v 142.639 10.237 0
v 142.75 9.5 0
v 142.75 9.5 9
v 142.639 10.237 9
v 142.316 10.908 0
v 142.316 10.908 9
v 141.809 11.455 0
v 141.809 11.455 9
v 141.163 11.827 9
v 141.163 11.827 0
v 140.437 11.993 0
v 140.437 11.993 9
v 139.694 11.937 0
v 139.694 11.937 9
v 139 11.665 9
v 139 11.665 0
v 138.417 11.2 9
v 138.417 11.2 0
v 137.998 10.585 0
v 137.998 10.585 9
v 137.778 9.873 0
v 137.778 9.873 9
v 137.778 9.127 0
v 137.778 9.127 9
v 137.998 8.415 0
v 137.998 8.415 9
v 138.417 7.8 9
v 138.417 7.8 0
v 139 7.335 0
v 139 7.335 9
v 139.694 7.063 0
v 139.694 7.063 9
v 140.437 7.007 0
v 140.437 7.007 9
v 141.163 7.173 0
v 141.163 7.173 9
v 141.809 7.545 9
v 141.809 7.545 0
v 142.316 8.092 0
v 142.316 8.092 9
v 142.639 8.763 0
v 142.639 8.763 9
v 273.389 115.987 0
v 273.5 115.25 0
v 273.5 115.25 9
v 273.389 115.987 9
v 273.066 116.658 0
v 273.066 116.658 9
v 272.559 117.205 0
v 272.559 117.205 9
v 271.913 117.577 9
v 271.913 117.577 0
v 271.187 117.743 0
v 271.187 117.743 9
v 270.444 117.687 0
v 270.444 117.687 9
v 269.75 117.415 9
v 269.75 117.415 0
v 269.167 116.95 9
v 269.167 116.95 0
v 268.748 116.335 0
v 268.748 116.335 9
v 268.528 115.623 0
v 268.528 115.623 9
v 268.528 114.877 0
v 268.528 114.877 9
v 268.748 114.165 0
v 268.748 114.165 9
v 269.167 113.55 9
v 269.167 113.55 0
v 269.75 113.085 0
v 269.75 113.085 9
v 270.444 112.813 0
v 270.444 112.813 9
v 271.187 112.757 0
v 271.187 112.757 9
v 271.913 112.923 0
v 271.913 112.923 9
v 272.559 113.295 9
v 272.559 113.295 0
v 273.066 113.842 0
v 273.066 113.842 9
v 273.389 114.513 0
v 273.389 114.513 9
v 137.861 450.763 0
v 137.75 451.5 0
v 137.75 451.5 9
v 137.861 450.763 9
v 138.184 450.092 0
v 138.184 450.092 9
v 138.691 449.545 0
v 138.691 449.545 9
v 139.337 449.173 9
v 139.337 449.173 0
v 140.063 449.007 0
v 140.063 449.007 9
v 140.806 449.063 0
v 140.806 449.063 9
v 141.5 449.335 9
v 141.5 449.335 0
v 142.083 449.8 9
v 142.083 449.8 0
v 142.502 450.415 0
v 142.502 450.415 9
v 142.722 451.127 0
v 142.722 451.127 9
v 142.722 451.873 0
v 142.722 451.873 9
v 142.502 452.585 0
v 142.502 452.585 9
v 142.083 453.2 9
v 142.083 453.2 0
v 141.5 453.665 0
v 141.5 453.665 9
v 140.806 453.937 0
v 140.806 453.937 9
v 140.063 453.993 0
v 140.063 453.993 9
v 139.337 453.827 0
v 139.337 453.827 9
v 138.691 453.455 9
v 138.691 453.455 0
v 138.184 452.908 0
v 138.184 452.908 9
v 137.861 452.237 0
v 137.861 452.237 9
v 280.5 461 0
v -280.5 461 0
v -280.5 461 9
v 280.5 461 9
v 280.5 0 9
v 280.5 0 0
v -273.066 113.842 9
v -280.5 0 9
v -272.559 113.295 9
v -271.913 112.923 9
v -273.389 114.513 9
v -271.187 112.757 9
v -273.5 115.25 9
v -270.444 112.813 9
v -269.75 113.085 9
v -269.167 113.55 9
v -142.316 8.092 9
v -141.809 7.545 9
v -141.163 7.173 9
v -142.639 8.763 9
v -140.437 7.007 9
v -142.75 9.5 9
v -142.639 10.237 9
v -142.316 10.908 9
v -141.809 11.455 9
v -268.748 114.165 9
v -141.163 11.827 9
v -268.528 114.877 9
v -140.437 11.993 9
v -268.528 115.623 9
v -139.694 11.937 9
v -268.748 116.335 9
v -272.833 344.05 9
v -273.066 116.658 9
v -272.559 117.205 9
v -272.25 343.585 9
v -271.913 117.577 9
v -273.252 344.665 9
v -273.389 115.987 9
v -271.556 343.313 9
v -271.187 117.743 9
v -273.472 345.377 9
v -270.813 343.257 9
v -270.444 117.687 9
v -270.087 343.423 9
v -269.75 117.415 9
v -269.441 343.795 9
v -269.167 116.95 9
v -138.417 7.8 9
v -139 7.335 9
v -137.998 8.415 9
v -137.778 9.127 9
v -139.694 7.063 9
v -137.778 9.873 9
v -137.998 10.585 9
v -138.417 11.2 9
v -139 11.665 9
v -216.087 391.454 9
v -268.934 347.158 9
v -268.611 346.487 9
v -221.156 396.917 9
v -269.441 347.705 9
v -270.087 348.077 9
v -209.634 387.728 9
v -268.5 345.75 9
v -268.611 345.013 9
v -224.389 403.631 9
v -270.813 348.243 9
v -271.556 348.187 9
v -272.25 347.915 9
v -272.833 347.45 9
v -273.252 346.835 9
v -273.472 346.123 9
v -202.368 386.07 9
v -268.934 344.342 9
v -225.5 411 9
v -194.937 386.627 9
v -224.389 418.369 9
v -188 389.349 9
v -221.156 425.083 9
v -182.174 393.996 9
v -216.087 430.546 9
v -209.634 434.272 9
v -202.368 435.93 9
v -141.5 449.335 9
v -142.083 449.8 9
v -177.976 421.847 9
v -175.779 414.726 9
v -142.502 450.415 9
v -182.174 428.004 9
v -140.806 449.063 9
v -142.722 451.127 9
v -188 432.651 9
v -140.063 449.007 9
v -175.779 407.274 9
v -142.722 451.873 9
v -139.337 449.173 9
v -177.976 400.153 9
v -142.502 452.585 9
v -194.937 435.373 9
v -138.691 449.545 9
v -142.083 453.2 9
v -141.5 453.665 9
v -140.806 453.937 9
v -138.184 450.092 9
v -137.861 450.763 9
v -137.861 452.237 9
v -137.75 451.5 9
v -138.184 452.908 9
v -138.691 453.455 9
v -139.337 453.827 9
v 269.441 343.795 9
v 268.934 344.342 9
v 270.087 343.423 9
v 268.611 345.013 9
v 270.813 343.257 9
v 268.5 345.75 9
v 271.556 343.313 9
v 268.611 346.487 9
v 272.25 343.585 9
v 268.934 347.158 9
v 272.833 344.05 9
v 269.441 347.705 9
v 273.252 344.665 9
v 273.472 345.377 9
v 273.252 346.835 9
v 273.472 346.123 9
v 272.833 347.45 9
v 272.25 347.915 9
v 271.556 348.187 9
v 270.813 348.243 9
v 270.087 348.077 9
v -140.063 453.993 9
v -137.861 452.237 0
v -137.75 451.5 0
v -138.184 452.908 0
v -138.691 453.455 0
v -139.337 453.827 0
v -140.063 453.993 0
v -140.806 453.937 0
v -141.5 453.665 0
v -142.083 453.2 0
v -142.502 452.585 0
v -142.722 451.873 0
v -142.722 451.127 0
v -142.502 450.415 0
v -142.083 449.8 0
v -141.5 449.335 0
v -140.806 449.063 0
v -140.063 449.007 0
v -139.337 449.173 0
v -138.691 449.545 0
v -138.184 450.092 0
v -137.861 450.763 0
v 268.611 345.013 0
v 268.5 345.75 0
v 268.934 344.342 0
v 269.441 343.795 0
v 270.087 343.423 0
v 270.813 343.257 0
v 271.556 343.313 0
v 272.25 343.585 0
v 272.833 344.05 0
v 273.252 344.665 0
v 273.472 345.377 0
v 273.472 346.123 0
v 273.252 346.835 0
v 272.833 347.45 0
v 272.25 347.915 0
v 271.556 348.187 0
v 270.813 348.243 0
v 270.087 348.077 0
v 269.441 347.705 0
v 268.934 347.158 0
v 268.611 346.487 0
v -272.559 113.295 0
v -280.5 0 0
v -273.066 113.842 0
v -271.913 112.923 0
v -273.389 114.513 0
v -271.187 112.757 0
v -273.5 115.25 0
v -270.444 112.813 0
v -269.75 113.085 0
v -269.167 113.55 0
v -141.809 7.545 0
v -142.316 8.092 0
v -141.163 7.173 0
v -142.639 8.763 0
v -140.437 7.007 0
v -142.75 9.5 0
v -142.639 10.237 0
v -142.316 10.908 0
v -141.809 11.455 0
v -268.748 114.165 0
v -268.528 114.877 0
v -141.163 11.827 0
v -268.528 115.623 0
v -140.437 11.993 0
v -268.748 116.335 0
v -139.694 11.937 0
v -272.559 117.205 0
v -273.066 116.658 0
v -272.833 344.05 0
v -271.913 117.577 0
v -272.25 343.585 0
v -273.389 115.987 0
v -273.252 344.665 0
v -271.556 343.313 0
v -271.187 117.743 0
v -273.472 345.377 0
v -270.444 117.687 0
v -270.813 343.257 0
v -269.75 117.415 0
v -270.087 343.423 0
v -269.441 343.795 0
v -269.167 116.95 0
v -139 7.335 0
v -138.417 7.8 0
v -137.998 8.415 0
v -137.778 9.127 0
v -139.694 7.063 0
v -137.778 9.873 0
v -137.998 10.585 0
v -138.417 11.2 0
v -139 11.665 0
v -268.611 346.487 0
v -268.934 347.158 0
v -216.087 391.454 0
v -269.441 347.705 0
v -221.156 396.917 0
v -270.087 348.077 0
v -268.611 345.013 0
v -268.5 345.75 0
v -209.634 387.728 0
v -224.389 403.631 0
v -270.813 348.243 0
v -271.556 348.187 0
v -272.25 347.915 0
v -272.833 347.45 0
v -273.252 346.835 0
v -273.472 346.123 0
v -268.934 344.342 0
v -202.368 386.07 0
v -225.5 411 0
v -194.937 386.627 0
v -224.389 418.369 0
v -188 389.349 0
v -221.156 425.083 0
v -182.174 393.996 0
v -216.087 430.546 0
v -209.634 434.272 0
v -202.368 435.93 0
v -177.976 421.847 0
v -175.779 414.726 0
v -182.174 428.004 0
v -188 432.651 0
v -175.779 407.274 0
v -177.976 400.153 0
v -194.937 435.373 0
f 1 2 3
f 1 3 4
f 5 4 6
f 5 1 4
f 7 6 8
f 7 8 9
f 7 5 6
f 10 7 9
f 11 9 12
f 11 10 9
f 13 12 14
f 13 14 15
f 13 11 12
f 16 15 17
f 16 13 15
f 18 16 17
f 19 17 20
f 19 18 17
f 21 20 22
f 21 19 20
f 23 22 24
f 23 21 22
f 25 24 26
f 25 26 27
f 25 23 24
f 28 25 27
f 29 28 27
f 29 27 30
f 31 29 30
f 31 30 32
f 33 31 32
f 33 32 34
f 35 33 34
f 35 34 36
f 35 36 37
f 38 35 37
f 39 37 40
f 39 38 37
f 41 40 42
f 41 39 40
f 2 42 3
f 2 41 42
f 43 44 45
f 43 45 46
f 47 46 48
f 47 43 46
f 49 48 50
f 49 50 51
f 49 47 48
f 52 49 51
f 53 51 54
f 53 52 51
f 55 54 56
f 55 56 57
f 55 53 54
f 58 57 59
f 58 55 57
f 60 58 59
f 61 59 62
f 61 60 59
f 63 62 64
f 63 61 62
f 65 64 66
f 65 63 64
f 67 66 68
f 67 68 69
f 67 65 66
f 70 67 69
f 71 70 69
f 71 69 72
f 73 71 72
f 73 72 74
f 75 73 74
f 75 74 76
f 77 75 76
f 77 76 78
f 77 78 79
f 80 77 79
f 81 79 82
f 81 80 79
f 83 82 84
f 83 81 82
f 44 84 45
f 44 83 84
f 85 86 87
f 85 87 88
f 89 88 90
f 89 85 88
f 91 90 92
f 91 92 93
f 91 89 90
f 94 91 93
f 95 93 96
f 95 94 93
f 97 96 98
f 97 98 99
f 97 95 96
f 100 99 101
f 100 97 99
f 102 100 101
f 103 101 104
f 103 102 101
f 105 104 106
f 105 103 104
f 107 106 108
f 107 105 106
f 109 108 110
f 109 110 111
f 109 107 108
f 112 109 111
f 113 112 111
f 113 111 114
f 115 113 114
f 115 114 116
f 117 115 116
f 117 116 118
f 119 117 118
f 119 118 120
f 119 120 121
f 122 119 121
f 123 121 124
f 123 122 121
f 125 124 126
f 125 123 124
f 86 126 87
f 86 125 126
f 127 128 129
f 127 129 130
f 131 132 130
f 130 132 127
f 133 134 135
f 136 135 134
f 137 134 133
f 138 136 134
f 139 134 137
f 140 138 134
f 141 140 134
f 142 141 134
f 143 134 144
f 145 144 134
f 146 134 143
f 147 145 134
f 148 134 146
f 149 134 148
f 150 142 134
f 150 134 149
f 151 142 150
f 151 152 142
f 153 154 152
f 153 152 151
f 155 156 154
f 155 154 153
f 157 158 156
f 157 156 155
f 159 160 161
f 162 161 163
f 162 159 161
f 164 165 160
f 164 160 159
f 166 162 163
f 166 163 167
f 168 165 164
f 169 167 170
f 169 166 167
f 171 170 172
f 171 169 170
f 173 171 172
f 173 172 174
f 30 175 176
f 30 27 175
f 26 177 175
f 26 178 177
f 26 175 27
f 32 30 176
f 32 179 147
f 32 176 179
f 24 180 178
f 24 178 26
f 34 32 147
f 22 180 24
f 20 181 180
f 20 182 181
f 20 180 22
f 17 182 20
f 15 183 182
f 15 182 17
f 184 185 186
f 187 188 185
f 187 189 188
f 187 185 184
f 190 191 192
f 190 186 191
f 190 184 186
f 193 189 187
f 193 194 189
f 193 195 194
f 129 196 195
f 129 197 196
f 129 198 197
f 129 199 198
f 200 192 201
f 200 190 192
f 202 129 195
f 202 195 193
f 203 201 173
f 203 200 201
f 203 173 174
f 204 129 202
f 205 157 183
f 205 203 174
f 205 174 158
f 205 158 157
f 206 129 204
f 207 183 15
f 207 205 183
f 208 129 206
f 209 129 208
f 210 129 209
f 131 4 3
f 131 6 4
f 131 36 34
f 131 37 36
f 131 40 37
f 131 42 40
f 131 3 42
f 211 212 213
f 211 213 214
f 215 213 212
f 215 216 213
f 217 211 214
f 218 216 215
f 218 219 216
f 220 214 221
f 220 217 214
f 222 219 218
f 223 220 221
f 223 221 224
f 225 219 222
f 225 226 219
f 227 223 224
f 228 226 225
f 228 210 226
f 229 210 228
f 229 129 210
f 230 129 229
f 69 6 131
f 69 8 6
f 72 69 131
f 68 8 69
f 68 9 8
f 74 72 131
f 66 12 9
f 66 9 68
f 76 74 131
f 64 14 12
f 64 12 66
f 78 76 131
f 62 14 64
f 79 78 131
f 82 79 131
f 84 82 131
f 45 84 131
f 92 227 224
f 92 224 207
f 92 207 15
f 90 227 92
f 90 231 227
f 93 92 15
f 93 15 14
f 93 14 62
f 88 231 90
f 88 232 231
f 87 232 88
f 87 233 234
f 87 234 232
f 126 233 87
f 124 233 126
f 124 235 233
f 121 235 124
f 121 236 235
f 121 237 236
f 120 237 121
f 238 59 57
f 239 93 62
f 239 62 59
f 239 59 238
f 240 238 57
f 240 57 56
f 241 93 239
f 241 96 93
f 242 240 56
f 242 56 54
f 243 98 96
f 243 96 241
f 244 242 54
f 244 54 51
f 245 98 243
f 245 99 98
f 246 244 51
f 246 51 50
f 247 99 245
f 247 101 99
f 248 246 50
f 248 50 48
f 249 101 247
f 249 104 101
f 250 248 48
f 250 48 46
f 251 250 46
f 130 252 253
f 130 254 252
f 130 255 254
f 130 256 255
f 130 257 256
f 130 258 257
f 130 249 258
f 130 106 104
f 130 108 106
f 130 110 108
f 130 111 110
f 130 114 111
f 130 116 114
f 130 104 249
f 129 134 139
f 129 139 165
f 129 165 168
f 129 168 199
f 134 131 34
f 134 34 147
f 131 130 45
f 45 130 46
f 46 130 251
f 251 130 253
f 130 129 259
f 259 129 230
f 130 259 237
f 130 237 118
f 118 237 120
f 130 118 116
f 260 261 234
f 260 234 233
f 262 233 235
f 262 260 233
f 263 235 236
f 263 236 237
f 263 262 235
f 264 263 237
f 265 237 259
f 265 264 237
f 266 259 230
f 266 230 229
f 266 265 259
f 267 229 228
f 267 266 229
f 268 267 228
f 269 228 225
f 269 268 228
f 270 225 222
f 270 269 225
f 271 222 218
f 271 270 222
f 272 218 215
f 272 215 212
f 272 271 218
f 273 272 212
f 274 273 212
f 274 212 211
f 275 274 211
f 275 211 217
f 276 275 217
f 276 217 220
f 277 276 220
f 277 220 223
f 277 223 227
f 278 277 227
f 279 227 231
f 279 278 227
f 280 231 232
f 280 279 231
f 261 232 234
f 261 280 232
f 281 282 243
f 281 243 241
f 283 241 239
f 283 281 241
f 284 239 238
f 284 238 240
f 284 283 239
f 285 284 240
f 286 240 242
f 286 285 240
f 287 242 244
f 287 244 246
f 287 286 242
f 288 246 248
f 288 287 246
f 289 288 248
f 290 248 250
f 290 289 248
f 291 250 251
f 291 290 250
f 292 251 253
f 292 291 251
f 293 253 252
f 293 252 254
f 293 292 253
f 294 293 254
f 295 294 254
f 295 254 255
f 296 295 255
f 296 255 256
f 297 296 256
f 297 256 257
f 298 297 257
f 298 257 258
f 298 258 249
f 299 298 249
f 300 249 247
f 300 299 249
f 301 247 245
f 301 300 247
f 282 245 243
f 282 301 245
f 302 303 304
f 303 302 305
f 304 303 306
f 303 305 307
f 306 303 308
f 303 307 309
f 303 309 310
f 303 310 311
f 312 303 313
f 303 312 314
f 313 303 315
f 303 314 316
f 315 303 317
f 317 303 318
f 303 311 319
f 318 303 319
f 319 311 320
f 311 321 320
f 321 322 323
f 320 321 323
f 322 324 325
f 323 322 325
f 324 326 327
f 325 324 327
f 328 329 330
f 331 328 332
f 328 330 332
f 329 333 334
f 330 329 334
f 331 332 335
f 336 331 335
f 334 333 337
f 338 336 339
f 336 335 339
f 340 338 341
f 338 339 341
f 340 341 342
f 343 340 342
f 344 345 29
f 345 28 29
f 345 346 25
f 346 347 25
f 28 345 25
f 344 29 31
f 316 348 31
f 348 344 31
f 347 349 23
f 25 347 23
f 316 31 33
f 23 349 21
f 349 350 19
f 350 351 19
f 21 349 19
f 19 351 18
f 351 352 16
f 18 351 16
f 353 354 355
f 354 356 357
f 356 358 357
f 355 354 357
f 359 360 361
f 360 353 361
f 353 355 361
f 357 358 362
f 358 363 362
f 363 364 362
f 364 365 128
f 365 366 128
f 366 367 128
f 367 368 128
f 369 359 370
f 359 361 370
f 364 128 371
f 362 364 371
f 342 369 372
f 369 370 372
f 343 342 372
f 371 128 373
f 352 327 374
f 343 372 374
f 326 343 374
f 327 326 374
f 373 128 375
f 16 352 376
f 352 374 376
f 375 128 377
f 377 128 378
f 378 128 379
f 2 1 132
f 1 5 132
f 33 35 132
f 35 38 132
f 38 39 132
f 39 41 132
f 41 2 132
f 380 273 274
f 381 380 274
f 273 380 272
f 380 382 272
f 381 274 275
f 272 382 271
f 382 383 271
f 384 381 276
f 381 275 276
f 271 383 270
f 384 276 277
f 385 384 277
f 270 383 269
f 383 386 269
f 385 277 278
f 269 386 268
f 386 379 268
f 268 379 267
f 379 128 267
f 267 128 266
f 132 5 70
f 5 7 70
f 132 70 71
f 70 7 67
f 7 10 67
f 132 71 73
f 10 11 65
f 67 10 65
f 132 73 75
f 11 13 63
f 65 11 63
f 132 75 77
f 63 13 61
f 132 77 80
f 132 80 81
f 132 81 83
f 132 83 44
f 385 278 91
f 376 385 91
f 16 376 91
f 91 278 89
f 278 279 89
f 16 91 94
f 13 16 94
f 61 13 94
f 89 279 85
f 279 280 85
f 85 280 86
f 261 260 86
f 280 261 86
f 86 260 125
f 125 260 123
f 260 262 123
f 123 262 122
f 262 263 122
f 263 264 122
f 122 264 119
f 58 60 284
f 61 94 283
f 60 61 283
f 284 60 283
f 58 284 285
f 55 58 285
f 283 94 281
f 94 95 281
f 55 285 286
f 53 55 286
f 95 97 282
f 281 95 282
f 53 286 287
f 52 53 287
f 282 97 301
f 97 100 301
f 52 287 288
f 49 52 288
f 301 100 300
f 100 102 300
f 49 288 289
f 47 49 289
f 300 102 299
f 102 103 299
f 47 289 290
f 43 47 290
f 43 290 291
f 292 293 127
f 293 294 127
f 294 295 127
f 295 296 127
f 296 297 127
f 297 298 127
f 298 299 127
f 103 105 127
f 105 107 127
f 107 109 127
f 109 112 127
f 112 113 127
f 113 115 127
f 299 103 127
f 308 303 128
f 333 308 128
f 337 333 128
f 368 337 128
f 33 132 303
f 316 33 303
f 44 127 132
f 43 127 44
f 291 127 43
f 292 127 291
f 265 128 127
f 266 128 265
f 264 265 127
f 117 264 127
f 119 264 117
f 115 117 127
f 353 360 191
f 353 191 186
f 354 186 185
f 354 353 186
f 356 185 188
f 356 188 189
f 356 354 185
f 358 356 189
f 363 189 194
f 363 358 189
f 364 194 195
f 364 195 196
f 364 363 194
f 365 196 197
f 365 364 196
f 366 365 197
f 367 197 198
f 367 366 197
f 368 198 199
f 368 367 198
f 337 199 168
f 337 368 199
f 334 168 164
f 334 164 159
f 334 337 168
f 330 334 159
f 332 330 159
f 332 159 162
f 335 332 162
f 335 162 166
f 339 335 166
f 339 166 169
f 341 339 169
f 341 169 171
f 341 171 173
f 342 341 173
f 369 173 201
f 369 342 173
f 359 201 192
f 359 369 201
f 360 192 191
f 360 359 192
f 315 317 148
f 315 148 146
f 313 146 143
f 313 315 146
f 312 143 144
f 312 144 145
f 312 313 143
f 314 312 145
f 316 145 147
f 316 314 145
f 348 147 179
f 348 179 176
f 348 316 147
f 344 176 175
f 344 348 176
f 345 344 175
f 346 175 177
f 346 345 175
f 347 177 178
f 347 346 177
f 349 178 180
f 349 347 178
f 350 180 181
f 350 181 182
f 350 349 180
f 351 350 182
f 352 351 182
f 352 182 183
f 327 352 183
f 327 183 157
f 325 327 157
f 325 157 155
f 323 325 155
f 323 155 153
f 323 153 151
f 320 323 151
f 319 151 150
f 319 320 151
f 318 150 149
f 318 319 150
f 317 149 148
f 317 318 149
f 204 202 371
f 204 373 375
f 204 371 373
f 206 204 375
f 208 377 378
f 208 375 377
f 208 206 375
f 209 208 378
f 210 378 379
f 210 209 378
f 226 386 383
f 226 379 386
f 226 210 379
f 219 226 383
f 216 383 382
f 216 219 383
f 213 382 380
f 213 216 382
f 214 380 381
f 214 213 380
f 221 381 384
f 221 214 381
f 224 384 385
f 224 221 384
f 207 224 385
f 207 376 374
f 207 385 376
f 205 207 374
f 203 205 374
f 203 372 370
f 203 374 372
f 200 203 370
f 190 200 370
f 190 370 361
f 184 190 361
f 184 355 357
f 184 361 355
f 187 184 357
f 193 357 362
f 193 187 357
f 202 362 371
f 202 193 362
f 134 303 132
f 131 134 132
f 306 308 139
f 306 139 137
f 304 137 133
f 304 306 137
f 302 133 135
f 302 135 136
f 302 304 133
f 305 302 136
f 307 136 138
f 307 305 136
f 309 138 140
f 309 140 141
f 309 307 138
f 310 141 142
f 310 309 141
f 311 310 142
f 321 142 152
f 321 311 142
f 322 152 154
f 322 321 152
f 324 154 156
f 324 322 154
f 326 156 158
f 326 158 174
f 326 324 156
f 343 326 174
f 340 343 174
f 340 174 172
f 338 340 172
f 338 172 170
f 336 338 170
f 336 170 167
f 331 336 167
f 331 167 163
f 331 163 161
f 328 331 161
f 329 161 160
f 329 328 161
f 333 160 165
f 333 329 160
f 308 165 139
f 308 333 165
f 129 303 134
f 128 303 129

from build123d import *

# Parameters (mm, degrees)
SKETCH_1_W               = 561
SKETCH_1_H               = 461
SKETCH_1_R               = 2.5
EXTRUDE_1_DEPTH          = 9
CUT_EXTRUDE_1_DEPTH      = 540.705706844
CUT_EXTRUDE_1_DEPTH_BACK = 540.705706844
SKETCH_2_R               = 25


with BuildPart() as part:
    # 草图1 → 凸台-拉伸1 (new body)
    with BuildSketch(Plane.XY):
        with Locations((0, 230.5)):
            Rectangle(SKETCH_1_W, SKETCH_1_H)
        with Locations((-140.25, 451.5)):
            Circle(SKETCH_1_R, mode=Mode.SUBTRACT)
        with Locations((-271, 345.75)):
            Circle(SKETCH_1_R, mode=Mode.SUBTRACT)
        with Locations(Location((271, 345.75, 0), (0, 0, 180))):
            Circle(SKETCH_1_R, mode=Mode.SUBTRACT)
        with Locations(Location((140.25, 451.5, 0), (0, 0, 180))):
            Circle(SKETCH_1_R, mode=Mode.SUBTRACT)
        with Locations((271, 115.25)):
            Circle(SKETCH_1_R, mode=Mode.SUBTRACT)
        with Locations((140.25, 9.5)):
            Circle(SKETCH_1_R, mode=Mode.SUBTRACT)
        with Locations(Location((-271, 115.25, 0), (0, 0, 180))):
            Circle(SKETCH_1_R, mode=Mode.SUBTRACT)
        with Locations(Location((-140.25, 9.5, 0), (0, 0, 180))):
            Circle(SKETCH_1_R, mode=Mode.SUBTRACT)
    extrude(amount=EXTRUDE_1_DEPTH)

    # 草图2 → 切除-拉伸1 (cut, two sides: drawn at the far end of the back side and taken through both)
    with BuildSketch(Plane(origin=(0, 0, 0), x_dir=(-1, 0, 0), z_dir=(0, 0, -1)).offset(-CUT_EXTRUDE_1_DEPTH_BACK)):
        with Locations((200.5, 411)):
            Circle(SKETCH_2_R)
    extrude(amount=CUT_EXTRUDE_1_DEPTH + CUT_EXTRUDE_1_DEPTH_BACK, mode=Mode.SUBTRACT)


solid = part.part
